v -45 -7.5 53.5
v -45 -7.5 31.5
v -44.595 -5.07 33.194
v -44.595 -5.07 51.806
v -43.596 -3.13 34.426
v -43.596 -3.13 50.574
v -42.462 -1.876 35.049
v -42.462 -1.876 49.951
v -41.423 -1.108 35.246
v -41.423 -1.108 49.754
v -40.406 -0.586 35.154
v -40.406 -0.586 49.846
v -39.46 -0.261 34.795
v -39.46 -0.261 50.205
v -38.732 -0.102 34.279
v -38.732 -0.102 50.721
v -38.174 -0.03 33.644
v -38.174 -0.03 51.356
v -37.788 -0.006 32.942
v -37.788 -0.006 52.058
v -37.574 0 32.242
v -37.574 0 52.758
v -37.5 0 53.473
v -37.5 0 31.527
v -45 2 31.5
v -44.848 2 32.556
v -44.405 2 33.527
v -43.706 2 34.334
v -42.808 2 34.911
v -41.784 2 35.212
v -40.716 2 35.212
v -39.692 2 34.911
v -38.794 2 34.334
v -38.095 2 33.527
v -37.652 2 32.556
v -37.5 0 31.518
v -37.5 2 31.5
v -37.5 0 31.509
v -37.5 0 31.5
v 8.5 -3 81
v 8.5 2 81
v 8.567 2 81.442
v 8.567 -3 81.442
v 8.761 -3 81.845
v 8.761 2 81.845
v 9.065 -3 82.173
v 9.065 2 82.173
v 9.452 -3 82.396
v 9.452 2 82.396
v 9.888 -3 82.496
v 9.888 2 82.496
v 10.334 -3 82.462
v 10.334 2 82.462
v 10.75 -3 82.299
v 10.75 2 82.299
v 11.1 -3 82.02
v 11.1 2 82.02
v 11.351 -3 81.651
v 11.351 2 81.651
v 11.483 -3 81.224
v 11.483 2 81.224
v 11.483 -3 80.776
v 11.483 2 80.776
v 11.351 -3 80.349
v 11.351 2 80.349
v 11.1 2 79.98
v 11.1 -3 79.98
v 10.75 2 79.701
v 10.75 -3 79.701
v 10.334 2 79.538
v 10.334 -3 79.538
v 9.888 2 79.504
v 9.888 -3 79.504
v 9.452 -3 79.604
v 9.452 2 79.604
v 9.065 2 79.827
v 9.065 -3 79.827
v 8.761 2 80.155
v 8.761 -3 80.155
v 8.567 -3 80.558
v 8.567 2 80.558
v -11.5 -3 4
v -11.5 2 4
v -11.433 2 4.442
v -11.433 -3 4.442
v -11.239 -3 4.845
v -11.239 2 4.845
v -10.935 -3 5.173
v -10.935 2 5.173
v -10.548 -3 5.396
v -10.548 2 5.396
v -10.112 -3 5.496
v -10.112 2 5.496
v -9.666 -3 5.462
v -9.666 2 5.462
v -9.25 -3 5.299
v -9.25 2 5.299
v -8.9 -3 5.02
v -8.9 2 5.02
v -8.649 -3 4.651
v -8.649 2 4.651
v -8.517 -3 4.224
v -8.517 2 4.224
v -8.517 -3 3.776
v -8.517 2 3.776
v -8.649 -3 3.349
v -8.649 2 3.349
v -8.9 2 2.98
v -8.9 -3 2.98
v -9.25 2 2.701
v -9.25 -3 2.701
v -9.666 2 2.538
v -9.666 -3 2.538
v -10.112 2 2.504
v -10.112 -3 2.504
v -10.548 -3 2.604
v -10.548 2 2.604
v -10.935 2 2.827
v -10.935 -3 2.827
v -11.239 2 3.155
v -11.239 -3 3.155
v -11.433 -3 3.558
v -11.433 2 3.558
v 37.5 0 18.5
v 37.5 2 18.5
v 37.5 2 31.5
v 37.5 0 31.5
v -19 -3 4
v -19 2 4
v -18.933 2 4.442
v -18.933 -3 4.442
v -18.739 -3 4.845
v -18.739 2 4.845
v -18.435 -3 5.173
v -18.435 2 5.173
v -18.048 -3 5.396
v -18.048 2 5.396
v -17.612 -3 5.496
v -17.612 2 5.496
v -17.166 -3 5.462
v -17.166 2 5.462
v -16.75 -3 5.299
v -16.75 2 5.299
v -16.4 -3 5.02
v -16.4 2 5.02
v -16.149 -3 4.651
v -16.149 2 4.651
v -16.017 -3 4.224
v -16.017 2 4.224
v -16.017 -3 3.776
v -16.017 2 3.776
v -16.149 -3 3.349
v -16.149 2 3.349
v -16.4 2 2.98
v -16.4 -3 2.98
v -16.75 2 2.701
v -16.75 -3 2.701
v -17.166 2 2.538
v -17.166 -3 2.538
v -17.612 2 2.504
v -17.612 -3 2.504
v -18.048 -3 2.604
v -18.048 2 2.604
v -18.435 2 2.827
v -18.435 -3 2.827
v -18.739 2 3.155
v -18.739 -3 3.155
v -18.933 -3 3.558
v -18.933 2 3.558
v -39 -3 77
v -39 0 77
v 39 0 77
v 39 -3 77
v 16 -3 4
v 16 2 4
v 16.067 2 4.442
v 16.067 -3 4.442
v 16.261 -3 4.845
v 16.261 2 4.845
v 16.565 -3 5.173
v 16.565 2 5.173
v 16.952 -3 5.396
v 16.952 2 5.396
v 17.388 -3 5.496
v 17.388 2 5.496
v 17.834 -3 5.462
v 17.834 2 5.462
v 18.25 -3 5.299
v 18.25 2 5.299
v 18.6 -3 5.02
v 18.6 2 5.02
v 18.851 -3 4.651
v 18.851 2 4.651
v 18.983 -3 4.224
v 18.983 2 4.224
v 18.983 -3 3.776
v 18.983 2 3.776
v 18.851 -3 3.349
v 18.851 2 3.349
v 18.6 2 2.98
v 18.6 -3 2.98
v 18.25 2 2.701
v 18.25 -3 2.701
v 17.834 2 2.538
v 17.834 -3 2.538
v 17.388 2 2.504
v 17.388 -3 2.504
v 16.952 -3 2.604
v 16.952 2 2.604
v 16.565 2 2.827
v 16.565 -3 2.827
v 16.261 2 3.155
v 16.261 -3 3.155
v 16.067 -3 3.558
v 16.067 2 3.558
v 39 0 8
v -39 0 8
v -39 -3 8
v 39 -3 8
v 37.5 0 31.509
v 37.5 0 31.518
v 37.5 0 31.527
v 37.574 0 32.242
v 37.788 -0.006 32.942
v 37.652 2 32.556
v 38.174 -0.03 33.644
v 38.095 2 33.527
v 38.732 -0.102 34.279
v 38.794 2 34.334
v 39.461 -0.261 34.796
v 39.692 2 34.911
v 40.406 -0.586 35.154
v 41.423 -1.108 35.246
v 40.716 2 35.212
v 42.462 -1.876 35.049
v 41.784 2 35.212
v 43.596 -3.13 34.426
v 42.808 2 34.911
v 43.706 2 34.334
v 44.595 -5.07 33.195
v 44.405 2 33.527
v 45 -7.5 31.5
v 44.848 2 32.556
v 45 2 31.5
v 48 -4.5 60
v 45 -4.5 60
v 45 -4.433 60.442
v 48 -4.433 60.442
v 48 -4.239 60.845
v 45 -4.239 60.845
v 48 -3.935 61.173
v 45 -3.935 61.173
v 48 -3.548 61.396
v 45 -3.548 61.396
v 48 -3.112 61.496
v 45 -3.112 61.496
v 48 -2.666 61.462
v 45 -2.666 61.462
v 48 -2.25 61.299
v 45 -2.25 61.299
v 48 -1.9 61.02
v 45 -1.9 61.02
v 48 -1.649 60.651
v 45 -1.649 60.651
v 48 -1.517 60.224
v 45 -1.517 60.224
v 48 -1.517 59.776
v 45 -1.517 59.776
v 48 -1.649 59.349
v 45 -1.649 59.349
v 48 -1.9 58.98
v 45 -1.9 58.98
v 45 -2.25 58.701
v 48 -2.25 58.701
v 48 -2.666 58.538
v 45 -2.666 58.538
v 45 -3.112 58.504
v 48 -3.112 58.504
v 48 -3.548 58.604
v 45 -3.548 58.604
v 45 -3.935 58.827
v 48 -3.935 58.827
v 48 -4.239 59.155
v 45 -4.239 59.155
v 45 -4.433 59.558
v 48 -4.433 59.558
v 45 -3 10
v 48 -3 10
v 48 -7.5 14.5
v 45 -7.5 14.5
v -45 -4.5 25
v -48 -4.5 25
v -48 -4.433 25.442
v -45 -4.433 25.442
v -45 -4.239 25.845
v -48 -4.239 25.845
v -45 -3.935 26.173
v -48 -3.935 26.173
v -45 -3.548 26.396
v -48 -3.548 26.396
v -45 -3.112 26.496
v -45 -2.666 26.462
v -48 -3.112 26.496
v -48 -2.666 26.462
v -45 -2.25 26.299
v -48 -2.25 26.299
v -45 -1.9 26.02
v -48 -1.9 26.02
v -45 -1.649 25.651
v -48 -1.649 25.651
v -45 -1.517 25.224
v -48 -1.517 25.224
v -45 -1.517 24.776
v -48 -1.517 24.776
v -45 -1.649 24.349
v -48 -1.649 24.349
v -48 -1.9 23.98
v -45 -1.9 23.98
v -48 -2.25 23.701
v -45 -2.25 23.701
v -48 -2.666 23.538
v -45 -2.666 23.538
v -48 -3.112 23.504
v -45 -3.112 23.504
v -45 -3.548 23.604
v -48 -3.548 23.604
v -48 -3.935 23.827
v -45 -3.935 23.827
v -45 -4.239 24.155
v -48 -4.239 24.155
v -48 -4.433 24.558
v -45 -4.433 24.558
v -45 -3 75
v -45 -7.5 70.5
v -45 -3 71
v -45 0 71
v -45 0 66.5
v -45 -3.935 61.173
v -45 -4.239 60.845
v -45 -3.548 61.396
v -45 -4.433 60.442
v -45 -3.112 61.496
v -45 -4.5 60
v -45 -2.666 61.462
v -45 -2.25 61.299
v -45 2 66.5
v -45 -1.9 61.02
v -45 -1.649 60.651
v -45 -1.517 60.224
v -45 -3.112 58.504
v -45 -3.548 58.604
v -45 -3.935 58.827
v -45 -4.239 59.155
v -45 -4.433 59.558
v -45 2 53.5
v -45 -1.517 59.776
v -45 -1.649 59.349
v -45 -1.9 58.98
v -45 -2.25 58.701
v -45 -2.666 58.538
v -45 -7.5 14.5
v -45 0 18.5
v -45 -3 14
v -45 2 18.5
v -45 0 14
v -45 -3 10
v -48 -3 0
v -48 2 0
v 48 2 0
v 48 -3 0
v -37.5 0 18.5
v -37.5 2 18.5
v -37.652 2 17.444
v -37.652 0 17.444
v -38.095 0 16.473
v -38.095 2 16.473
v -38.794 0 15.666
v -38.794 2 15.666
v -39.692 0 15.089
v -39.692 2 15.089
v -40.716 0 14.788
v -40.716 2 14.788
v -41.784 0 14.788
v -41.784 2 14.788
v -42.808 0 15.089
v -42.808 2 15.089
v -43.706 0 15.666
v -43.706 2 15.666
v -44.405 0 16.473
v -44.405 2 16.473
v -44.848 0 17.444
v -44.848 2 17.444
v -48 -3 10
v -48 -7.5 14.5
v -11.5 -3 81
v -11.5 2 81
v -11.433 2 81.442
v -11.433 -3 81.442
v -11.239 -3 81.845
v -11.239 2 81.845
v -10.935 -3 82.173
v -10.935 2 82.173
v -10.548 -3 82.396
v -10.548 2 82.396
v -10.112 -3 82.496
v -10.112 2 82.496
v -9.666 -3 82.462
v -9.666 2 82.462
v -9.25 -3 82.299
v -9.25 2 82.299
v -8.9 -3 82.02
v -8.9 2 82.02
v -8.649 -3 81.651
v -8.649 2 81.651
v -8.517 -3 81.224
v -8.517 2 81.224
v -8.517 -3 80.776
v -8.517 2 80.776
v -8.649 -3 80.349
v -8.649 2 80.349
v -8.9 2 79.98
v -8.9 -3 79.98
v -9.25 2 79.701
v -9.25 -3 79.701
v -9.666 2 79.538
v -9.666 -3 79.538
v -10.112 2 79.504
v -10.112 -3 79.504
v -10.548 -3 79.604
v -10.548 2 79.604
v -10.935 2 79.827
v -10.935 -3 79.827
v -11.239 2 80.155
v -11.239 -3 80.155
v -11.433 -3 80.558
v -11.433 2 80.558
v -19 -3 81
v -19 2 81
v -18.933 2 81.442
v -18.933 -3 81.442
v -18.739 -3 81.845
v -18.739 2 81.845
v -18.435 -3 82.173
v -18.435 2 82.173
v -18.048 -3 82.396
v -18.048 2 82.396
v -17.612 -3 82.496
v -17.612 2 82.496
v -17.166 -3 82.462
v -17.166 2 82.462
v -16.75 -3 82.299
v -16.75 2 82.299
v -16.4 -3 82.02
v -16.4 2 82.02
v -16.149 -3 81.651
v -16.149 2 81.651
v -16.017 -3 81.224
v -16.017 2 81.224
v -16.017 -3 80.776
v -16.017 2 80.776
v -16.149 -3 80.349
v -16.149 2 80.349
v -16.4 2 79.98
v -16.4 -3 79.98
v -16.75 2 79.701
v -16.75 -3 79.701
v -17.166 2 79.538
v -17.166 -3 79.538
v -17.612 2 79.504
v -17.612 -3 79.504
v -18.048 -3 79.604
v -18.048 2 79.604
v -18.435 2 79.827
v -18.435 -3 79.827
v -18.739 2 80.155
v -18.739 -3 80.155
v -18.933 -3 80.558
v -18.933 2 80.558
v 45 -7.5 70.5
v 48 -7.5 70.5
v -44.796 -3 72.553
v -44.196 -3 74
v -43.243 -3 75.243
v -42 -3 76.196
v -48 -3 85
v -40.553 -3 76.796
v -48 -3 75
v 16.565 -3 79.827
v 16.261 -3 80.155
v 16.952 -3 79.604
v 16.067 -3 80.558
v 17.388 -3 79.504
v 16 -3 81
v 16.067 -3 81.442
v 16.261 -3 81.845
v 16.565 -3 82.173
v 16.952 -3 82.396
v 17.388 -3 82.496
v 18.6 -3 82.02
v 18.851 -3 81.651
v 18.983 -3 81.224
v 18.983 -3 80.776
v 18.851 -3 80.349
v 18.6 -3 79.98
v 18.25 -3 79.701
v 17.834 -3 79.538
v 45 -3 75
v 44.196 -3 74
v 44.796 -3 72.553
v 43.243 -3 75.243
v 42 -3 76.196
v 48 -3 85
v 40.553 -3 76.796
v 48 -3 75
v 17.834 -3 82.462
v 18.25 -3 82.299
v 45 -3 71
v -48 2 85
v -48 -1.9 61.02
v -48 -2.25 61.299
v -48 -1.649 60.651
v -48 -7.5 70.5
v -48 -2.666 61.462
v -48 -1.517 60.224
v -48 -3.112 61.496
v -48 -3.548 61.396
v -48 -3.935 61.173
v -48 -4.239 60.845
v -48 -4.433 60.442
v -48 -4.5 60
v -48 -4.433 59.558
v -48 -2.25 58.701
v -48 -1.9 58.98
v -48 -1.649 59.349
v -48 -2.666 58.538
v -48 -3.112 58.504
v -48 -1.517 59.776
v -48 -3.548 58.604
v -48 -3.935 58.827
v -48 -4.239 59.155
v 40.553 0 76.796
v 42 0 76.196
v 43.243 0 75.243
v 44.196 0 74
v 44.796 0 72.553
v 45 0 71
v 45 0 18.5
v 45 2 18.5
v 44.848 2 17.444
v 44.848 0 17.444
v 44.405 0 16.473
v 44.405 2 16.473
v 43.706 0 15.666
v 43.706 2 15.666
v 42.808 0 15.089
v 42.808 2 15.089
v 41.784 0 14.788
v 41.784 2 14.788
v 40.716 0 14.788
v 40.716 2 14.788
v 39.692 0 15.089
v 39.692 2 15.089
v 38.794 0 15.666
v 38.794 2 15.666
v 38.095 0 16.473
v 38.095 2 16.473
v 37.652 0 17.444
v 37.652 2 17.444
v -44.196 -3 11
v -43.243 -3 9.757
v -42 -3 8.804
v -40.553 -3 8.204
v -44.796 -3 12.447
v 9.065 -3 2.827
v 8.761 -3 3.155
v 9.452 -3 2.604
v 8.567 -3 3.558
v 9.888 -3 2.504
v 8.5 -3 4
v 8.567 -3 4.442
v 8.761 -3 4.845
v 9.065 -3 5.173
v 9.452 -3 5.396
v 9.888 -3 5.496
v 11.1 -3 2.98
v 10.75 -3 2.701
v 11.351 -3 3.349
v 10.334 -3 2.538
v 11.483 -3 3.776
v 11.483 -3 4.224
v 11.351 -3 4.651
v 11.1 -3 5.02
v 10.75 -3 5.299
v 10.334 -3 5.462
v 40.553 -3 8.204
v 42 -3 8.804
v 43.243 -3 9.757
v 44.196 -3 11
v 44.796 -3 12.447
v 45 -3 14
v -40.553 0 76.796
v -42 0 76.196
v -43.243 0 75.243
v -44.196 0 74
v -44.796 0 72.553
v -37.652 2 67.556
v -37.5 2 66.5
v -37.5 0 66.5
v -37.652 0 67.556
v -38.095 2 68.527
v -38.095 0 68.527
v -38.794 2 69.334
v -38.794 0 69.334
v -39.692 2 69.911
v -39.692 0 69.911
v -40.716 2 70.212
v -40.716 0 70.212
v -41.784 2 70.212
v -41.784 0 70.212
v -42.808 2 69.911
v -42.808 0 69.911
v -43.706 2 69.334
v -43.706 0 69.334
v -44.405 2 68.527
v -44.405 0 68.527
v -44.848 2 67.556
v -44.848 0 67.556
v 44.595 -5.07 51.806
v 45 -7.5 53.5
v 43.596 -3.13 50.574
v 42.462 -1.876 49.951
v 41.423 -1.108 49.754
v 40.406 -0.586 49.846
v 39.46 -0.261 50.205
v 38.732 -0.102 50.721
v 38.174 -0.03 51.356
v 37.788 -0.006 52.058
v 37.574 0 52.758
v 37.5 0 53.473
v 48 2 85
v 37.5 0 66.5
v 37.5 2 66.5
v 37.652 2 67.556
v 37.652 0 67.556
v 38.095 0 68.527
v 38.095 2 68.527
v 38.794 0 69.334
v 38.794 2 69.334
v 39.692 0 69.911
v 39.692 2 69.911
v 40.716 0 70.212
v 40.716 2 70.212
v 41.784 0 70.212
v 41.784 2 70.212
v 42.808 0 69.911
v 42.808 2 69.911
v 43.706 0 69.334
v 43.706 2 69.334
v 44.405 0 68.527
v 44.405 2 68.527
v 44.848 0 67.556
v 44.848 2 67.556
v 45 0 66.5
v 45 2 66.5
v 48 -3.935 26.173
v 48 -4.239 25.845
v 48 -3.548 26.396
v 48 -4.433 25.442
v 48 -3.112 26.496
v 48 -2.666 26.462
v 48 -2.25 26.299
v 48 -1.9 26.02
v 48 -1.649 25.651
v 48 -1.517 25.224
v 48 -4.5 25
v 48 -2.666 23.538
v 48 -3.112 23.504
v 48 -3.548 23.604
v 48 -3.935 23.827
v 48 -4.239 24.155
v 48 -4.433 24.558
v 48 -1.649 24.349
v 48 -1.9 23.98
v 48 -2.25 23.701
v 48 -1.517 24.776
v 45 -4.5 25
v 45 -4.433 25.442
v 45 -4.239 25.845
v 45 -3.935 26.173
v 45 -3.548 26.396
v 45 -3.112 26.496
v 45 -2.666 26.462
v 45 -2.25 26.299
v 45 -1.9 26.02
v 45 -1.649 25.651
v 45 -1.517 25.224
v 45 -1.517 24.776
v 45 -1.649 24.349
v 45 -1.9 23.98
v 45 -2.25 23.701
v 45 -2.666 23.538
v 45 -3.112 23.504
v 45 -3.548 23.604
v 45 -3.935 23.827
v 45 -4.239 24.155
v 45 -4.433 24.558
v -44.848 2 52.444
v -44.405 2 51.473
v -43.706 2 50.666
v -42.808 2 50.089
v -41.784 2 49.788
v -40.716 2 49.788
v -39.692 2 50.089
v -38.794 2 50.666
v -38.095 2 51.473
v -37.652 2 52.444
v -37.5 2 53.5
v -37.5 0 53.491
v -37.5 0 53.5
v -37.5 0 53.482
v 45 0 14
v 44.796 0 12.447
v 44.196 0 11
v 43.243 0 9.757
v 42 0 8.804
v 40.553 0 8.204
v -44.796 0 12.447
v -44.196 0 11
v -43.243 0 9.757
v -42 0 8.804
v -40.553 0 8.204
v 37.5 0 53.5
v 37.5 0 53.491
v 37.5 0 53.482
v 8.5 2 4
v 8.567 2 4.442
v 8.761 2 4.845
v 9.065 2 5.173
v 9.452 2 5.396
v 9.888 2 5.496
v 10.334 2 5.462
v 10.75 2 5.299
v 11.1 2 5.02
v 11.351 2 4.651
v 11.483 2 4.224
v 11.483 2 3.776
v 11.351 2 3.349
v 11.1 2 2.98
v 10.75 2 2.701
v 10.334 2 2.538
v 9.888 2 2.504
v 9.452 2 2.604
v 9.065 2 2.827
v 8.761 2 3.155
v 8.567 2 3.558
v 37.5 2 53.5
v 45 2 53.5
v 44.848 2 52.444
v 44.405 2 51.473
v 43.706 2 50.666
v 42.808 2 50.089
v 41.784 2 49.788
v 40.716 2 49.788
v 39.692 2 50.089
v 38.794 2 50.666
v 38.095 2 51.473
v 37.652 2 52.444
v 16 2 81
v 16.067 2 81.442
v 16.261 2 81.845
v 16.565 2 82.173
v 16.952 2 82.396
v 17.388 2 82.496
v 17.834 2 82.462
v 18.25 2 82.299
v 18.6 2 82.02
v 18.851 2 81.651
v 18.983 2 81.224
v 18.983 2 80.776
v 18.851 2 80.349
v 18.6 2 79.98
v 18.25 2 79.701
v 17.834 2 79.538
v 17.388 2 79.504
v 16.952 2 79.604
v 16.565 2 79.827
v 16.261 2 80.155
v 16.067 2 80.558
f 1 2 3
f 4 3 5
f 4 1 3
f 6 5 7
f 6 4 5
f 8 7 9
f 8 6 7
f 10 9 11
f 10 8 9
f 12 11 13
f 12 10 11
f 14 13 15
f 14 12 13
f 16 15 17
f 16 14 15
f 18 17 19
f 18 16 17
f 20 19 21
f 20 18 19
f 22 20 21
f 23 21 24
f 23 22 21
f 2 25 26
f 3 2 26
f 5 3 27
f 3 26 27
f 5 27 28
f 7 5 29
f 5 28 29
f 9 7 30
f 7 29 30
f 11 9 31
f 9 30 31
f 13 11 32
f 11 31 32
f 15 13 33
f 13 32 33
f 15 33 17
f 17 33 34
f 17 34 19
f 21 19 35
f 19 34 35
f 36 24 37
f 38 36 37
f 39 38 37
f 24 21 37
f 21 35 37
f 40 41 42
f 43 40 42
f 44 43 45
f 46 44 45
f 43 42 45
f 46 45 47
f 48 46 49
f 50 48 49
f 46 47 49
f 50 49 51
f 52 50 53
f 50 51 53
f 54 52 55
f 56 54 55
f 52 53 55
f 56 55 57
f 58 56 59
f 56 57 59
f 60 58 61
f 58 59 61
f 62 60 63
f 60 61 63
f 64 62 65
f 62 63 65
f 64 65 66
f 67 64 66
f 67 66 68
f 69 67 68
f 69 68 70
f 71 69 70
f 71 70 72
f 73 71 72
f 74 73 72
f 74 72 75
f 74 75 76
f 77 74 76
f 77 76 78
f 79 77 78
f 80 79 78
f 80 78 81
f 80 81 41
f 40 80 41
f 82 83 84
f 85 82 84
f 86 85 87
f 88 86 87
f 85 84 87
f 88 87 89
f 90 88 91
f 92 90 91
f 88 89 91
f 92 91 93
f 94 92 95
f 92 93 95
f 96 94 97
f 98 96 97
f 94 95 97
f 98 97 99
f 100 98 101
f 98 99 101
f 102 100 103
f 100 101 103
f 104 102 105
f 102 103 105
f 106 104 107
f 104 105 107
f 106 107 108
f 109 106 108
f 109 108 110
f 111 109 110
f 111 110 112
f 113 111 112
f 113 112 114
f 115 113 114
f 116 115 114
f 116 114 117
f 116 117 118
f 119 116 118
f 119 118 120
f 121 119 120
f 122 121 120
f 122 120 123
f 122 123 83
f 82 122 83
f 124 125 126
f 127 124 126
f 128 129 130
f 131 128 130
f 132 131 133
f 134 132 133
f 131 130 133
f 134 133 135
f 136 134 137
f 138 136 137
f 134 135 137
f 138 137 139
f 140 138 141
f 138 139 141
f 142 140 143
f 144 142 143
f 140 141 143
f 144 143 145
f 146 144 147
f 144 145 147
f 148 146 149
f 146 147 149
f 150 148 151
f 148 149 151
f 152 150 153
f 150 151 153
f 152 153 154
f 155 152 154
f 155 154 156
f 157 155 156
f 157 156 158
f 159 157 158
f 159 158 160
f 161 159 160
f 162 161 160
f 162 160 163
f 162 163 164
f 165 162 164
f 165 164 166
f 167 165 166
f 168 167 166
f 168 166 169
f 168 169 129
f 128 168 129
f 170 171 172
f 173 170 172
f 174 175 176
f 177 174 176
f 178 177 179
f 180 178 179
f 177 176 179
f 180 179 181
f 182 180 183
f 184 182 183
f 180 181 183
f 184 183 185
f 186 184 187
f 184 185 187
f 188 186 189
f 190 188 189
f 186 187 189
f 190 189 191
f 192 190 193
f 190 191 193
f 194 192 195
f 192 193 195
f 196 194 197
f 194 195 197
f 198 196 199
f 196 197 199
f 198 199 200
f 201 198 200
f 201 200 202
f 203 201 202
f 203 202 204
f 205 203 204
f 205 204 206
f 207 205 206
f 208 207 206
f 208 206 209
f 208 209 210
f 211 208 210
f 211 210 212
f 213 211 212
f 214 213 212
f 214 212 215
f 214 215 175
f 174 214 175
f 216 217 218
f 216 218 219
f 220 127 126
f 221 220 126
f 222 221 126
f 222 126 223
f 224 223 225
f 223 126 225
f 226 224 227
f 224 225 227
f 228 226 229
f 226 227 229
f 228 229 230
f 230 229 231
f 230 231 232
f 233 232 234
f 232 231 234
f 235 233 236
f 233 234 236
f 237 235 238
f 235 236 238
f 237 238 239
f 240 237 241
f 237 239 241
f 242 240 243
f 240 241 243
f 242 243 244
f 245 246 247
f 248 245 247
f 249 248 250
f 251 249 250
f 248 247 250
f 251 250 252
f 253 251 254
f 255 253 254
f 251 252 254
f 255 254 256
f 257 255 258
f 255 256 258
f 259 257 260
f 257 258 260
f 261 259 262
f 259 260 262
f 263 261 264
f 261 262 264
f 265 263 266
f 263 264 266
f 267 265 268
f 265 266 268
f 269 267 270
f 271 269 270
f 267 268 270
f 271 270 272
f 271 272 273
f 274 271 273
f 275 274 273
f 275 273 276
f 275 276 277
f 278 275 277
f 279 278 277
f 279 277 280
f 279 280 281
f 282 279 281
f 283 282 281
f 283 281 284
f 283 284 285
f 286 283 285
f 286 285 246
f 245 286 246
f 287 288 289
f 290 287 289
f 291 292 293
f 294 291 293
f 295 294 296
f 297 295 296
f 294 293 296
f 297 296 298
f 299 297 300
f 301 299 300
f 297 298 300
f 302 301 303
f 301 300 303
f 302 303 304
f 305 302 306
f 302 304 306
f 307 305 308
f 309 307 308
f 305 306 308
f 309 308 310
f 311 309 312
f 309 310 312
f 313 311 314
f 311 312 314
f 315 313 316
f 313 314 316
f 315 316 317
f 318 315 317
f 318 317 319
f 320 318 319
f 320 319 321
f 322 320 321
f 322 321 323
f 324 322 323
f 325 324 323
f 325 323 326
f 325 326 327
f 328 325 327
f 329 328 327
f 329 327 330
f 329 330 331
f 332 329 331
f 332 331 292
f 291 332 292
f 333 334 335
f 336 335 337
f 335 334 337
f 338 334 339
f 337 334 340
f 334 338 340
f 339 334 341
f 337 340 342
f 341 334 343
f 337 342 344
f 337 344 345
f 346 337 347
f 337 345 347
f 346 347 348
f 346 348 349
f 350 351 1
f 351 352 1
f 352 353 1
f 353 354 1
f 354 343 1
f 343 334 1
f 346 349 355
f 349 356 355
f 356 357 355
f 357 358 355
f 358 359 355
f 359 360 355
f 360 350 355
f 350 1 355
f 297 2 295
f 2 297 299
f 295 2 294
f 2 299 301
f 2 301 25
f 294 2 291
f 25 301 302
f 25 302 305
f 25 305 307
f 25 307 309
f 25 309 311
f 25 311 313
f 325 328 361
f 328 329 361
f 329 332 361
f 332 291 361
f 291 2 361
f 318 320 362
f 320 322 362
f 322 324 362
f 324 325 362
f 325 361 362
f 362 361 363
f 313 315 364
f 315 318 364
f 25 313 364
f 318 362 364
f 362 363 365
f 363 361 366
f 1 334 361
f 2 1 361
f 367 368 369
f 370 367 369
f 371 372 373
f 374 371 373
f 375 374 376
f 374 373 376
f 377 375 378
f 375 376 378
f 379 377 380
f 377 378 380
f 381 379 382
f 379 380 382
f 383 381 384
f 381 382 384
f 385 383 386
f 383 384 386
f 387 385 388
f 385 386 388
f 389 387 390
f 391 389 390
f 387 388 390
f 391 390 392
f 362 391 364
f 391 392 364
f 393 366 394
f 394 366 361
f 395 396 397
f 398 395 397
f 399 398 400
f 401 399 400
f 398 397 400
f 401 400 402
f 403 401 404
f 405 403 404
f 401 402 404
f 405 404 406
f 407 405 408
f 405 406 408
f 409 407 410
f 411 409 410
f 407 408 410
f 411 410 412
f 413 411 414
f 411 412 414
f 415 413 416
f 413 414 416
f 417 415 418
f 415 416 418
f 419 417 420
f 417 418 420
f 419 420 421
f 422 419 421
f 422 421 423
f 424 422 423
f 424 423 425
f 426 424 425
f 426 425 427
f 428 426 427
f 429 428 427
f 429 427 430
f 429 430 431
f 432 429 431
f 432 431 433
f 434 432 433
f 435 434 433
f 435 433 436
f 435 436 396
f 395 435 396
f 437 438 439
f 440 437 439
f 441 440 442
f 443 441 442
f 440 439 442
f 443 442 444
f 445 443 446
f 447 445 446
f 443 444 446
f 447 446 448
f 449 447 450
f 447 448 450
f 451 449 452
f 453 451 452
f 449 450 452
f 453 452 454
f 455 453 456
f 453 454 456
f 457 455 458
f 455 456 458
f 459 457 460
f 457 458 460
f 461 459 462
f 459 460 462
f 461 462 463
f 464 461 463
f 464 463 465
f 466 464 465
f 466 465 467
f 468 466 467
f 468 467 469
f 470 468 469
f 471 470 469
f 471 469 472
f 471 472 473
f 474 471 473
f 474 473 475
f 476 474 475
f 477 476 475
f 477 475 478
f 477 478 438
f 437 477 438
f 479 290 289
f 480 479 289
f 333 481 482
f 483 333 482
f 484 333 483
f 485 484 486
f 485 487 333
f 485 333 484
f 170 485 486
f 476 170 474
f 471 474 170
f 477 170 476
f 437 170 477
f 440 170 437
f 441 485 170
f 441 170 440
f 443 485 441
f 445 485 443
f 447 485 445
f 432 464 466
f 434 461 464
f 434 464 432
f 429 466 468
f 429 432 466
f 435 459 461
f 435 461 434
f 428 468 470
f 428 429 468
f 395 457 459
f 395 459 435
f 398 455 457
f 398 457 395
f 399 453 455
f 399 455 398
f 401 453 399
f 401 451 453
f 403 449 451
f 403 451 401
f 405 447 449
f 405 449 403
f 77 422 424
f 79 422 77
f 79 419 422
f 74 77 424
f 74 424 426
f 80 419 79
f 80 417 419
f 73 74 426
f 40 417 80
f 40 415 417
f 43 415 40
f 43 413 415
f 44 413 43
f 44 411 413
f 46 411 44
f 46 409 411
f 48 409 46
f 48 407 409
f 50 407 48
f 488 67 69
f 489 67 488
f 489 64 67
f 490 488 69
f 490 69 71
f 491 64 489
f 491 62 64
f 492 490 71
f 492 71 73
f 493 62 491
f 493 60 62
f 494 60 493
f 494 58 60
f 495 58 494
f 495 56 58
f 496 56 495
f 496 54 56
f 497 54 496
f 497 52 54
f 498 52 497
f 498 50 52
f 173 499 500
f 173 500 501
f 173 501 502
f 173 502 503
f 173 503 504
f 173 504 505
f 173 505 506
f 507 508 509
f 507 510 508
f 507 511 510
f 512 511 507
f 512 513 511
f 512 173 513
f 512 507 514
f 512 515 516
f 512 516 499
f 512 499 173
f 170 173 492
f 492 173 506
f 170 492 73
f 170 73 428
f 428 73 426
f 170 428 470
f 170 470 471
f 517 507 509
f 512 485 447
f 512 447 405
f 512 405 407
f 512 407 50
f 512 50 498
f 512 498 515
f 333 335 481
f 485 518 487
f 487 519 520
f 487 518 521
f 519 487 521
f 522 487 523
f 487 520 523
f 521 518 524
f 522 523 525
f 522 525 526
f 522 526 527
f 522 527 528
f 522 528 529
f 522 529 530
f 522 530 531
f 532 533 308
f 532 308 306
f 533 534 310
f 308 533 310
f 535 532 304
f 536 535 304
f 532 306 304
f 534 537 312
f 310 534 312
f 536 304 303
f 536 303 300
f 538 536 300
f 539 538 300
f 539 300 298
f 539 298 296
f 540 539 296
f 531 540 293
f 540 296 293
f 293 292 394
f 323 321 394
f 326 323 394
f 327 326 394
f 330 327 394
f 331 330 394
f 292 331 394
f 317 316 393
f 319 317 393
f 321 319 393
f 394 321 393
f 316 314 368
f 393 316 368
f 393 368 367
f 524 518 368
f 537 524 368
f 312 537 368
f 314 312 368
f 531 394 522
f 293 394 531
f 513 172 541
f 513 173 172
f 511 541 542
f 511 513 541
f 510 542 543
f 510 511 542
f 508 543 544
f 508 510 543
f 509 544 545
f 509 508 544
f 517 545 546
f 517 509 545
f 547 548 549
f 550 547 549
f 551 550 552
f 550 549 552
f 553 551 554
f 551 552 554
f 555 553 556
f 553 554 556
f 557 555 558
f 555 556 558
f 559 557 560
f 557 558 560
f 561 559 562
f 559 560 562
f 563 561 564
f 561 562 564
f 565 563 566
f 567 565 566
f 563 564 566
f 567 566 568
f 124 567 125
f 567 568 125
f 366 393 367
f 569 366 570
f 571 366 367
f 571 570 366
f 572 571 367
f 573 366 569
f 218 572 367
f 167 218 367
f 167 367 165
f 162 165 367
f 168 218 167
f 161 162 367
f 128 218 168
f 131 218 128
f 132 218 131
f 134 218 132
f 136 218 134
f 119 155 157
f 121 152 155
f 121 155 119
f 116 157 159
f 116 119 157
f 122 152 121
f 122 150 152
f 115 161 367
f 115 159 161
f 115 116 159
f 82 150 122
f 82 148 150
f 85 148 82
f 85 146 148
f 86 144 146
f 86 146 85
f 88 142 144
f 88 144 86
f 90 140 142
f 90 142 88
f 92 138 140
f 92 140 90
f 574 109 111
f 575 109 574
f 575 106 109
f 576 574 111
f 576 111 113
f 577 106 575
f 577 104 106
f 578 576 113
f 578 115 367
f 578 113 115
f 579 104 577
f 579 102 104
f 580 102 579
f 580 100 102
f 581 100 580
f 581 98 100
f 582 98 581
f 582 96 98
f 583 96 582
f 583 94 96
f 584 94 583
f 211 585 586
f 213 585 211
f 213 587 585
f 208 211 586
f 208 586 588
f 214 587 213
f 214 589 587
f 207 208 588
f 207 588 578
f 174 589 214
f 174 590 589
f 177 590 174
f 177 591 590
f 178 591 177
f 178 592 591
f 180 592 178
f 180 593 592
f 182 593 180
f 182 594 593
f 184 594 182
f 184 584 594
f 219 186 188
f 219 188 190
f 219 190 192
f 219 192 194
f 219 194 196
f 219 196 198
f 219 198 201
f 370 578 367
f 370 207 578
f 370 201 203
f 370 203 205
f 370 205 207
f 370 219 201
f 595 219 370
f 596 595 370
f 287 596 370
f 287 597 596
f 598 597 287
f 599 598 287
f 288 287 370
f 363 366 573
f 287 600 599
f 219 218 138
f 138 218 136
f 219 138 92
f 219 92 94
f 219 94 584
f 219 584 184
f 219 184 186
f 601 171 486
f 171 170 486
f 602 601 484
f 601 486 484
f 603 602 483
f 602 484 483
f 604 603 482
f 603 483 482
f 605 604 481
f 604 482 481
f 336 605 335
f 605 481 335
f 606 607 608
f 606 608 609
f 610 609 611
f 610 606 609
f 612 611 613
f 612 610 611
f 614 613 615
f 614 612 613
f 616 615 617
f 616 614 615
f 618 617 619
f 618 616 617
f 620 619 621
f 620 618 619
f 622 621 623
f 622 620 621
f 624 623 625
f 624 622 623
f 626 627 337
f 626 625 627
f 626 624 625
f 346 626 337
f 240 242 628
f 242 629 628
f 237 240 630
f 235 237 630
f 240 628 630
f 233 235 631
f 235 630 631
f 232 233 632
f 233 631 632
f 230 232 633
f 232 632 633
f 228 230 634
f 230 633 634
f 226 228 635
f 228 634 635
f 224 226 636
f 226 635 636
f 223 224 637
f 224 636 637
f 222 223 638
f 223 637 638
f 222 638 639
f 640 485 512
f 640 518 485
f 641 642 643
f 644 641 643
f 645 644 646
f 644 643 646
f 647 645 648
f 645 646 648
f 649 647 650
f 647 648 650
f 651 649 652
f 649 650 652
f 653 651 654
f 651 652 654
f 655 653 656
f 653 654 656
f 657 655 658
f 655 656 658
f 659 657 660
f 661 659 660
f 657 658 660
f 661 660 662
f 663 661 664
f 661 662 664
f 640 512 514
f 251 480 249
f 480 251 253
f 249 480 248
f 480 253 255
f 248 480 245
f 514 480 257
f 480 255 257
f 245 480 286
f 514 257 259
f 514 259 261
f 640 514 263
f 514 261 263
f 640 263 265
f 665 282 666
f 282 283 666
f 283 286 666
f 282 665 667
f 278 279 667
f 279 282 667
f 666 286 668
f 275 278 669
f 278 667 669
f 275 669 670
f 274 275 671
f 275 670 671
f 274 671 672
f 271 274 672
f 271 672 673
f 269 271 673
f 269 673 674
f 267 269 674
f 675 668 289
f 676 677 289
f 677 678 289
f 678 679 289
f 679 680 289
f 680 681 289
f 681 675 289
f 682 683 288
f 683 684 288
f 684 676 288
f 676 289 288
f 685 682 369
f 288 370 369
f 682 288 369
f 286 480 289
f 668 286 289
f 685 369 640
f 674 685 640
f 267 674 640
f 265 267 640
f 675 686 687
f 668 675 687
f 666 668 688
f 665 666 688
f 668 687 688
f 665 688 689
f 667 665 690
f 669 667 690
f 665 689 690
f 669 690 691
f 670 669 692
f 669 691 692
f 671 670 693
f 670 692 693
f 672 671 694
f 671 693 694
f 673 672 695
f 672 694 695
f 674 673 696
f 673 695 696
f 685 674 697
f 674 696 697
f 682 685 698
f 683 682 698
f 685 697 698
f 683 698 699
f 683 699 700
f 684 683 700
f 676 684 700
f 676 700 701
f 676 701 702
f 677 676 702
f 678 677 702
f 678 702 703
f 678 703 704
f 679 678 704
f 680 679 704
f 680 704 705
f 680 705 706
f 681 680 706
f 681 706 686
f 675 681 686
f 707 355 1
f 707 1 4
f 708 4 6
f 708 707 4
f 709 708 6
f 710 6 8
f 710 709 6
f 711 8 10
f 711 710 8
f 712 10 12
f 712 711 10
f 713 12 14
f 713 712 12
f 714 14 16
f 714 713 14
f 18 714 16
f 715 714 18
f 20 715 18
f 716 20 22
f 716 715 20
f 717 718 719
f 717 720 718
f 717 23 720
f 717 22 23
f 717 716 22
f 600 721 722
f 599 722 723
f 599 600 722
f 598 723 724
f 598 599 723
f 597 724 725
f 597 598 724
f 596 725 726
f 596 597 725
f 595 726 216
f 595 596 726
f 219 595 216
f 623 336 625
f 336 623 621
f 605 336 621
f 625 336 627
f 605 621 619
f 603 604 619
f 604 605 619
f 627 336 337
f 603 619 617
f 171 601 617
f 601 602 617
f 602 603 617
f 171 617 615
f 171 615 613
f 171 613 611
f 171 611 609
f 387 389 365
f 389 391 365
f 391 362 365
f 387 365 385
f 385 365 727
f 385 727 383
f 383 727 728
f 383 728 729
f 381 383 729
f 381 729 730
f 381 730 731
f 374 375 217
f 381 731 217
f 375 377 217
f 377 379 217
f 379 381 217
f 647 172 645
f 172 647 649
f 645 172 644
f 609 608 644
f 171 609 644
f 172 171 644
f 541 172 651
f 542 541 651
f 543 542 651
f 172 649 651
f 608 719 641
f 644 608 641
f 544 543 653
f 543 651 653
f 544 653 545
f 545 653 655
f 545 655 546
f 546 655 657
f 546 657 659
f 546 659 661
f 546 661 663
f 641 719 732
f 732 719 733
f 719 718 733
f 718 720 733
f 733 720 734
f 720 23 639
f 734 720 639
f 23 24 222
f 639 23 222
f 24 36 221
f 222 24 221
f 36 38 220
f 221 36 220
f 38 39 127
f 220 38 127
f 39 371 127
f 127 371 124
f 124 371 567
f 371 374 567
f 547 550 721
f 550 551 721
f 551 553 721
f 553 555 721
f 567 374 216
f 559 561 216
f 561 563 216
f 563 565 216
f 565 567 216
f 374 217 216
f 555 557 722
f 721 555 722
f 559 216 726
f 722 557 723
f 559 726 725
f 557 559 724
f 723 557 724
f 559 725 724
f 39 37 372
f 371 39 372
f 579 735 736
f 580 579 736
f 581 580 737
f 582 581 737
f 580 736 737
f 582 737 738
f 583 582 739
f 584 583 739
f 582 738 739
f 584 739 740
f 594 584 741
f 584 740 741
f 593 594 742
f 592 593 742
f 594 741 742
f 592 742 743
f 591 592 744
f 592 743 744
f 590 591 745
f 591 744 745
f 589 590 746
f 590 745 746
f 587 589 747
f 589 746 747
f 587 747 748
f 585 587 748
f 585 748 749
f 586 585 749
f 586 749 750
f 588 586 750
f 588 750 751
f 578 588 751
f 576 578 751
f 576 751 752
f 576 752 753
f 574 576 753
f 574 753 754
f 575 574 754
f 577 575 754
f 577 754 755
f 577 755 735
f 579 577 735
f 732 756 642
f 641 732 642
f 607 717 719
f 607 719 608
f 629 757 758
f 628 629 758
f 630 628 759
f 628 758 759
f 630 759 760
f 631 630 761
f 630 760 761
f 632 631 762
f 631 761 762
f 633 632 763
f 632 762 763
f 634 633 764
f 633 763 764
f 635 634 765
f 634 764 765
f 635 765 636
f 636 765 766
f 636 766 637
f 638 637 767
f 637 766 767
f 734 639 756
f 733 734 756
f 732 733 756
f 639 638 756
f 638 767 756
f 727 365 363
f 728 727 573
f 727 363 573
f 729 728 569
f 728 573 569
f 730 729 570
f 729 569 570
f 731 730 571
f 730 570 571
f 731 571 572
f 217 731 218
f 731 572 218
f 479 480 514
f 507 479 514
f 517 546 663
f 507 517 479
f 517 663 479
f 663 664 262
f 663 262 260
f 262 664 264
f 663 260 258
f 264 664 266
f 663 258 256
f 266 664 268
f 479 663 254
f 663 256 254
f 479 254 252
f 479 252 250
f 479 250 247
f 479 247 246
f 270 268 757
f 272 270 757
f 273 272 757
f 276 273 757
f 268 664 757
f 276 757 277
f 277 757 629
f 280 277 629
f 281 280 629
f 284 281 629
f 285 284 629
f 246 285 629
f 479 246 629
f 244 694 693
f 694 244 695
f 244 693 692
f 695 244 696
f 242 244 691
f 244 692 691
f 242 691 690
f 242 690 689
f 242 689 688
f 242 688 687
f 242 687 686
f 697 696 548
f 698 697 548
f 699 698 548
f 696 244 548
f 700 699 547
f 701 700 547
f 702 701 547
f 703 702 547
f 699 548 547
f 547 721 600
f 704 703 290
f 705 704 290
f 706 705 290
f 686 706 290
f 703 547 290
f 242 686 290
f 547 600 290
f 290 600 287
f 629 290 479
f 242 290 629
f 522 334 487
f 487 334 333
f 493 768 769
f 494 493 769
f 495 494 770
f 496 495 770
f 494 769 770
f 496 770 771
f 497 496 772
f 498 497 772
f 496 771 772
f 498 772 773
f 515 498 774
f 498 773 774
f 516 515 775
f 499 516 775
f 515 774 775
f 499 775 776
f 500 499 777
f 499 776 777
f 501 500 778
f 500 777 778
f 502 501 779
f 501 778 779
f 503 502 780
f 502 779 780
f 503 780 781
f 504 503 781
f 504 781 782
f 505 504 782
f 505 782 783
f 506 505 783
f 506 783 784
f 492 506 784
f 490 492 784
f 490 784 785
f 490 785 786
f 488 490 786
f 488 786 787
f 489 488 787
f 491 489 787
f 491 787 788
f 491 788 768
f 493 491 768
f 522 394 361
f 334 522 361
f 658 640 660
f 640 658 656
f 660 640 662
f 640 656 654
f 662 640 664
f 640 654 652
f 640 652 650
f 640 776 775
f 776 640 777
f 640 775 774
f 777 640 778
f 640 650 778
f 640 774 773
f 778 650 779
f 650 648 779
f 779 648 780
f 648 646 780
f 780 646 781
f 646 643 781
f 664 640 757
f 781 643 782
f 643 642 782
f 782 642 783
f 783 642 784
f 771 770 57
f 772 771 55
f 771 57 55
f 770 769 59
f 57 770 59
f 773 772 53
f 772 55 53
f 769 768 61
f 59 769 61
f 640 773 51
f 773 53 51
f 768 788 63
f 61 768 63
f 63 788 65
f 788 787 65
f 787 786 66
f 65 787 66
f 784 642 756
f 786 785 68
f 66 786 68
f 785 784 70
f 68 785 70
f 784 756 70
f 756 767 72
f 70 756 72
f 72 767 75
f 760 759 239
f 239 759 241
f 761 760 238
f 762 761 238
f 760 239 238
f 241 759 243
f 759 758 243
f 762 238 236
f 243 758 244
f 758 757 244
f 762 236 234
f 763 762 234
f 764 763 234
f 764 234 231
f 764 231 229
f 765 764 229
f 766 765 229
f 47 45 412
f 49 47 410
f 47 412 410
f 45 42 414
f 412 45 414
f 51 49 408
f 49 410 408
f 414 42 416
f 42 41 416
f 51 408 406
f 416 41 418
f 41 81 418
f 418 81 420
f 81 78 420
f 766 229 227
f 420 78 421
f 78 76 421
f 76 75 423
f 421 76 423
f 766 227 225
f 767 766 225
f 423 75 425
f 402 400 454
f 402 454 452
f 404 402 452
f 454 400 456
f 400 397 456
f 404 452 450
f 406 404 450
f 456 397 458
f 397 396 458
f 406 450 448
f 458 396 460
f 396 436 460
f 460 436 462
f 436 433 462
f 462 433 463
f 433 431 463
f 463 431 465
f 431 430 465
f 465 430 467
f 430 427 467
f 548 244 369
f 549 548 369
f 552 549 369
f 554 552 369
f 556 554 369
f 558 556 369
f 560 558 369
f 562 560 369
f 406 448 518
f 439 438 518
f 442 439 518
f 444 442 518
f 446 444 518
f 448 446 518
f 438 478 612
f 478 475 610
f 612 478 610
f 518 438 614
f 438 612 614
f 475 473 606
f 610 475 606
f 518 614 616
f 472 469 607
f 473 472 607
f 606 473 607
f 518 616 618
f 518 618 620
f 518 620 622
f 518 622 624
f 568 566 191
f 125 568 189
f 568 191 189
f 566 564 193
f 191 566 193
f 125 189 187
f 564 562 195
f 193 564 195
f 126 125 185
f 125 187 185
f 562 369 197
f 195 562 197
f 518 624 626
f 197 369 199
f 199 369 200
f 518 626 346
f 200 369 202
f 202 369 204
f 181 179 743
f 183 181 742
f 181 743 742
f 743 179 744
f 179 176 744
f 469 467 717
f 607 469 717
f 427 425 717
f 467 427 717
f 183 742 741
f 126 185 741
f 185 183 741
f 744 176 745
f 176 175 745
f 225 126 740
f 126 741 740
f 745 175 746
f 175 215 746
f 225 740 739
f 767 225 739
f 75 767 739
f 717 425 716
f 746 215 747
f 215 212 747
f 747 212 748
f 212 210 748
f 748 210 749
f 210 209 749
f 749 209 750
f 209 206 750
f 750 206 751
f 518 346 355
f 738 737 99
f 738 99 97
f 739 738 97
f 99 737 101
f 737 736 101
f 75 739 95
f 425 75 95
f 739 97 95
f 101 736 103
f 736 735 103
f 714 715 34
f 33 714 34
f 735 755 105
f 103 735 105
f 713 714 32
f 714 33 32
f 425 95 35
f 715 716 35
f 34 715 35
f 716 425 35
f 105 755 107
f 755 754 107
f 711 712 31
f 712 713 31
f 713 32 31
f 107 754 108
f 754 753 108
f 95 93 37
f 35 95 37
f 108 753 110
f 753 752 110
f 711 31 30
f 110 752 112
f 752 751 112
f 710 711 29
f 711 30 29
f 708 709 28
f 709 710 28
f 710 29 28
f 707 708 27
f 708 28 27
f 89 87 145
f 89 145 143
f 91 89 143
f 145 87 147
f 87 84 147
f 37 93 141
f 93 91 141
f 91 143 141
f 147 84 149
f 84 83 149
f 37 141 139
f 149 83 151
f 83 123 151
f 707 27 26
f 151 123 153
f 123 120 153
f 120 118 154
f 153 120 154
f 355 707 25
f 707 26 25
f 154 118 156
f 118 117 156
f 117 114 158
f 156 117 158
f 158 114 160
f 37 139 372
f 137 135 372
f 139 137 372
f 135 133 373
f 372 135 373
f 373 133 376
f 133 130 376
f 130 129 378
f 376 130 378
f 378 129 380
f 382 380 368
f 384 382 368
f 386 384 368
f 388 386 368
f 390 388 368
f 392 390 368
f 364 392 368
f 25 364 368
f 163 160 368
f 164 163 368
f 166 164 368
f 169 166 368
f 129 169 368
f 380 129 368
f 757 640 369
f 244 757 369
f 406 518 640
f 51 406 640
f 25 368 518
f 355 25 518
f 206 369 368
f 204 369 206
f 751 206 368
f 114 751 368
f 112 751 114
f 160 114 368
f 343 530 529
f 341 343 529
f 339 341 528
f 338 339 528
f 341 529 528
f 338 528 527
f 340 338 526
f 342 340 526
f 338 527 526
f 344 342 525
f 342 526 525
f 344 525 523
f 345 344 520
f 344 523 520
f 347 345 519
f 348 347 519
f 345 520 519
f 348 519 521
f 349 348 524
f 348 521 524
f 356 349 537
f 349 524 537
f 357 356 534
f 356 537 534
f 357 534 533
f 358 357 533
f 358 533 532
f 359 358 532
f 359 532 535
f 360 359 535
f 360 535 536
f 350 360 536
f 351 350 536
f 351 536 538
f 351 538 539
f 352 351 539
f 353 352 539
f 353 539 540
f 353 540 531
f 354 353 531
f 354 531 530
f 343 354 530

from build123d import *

# Parameters (mm, degrees)
BOSS_EXTRUDE1_DEPTH = 85
SKETCH3_R           = 1.5
CUT_EXTRUDE2_DEPTH  = 129.44162098
CUT_EXTRUDE3_DEPTH  = 99.07777526
SKETCH5_W           = 90
SKETCH5_H           = 8
BOSS_EXTRUDE2_DEPTH = 3
SKETCH6_R           = 1.5
CUT_EXTRUDE4_DEPTH  = 99.07777526
FILLET4_R           = 6
FILLET5_R           = 7.5
CUT_EXTRUDE5_DEPTH  = 129.44162098


with BuildPart() as part:
    # Sketch1 → Boss-Extrude1 (new body)
    with BuildSketch(Plane.XY):
        Polygon((-45, 0), (45, 0), (45, -7.5), (48, -7.5), (48, 2), (-48, 2), (-48, -7.5), (-45, -7.5), align=None)
    extrude(amount=BOSS_EXTRUDE1_DEPTH)

    # Sketch3 → Cut-Extrude2 (cut, through all)
    with BuildSketch(Plane.ZY.offset(48)):
        with Locations(Location((25, -3, 0), (0, 0, 270))):
            Circle(SKETCH3_R)
        with Locations(Location((60, -3, 0), (0, 0, 270))):
            Circle(SKETCH3_R)
    extrude(amount=-CUT_EXTRUDE2_DEPTH, mode=Mode.SUBTRACT)

    # Sketch4 → Cut-Extrude3 (cut, through all)
    with BuildSketch(Plane(origin=(0, 2, 0), x_dir=(1, 0, 0), z_dir=(0, 1, 0))):
        with BuildLine():
            Line((-37.5, -53.5), (-37.5, -66.5))
            ThreePointArc((-37.5, -66.5), (-41.25, -70.25), (-45, -66.5))
            Line((-45, -66.5), (-45, -53.5))
            ThreePointArc((-45, -53.5), (-41.25, -49.75), (-37.5, -53.5))
        make_face()
        with BuildLine():
            Line((-45, -18.5), (-45, -31.5))
            ThreePointArc((-45, -31.5), (-41.25, -35.25), (-37.5, -31.5))
            Line((-37.5, -31.5), (-37.5, -18.5))
            ThreePointArc((-37.5, -18.5), (-41.25, -14.75), (-45, -18.5))
        make_face()
        with BuildLine():
            Line((45, -31.5), (45, -18.5))
            ThreePointArc((45, -18.5), (41.25, -14.75), (37.5, -18.5))
            Line((37.5, -18.5), (37.5, -31.5))
            ThreePointArc((37.5, -31.5), (41.25, -35.25), (45, -31.5))
        make_face()
        with BuildLine():
            Line((45, -66.5), (45, -53.5))
            ThreePointArc((45, -53.5), (41.25, -49.75), (37.5, -53.5))
            Line((37.5, -53.5), (37.5, -66.5))
            ThreePointArc((37.5, -66.5), (41.25, -70.25), (45, -66.5))
        make_face()
    extrude(amount=-CUT_EXTRUDE3_DEPTH, mode=Mode.SUBTRACT)

    # Sketch5 → Boss-Extrude2 (add)
    with BuildSketch(Plane.XZ):
        with Locations((0, 81)):
            Rectangle(SKETCH5_W, SKETCH5_H)
        with Locations((0, 4)):
            Rectangle(SKETCH5_W, SKETCH5_H)
    extrude(amount=BOSS_EXTRUDE2_DEPTH)

    # Sketch6 → Cut-Extrude4 (cut, through all)
    with BuildSketch(Plane(origin=(0, 2, 0), x_dir=(1, 0, 0), z_dir=(0, 1, 0))):
        with Locations(Location((-17.5, -4, 0), (0, 0, 180))):
            Circle(SKETCH6_R)
        with Locations(Location((17.5, -4, 0), (0, 0, 180))):
            Circle(SKETCH6_R)
        with Locations(Location((-17.5, -81, 0), (0, 0, 180))):
            Circle(SKETCH6_R)
        with Locations(Location((17.5, -81, 0), (0, 0, 180))):
            Circle(SKETCH6_R)
        with Locations(Location((-10, -4, 0), (0, 0, 180))):
            Circle(SKETCH6_R)
        with Locations(Location((10, -4, 0), (0, 0, 180))):
            Circle(SKETCH6_R)
        with Locations(Location((-10, -81, 0), (0, 0, 180))):
            Circle(SKETCH6_R)
        with Locations(Location((10, -81, 0), (0, 0, 180))):
            Circle(SKETCH6_R)
    extrude(amount=-CUT_EXTRUDE4_DEPTH, mode=Mode.SUBTRACT)

    # Fillet4
    fillet4_edges = [part.edges().sort_by_distance(p)[0] for p in [
        (-45, -1.5, 77),
        (45, -1.5, 77),
        (-45, -1.5, 8),
        (45, -1.5, 8),
    ]]
    fillet(fillet4_edges, radius=FILLET4_R)

    # Fillet5
    fillet5_edges = [part.edges().sort_by_distance(p)[0] for p in [
        (45, 0, 42.5),
        (-45, 0, 42.5),
    ]]
    fillet(fillet5_edges, radius=FILLET5_R - 0.0001)  # a hair under: the kernel refuses the full size

    # Sketch7 → Cut-Extrude5 (cut, through all)
    with BuildSketch(Plane(origin=(48, 0, 0), x_dir=(0, 0, -1), z_dir=(1, 0, 0))):
        Polygon((-75, -3), (-85, -3), (-85, -7.5), (-70.5, -7.5), align=None)
        Polygon((-10, -3), (-14.5, -7.5), (0, -7.5), (0, -3), align=None)
    extrude(amount=-CUT_EXTRUDE5_DEPTH, mode=Mode.SUBTRACT)


solid = part.part
